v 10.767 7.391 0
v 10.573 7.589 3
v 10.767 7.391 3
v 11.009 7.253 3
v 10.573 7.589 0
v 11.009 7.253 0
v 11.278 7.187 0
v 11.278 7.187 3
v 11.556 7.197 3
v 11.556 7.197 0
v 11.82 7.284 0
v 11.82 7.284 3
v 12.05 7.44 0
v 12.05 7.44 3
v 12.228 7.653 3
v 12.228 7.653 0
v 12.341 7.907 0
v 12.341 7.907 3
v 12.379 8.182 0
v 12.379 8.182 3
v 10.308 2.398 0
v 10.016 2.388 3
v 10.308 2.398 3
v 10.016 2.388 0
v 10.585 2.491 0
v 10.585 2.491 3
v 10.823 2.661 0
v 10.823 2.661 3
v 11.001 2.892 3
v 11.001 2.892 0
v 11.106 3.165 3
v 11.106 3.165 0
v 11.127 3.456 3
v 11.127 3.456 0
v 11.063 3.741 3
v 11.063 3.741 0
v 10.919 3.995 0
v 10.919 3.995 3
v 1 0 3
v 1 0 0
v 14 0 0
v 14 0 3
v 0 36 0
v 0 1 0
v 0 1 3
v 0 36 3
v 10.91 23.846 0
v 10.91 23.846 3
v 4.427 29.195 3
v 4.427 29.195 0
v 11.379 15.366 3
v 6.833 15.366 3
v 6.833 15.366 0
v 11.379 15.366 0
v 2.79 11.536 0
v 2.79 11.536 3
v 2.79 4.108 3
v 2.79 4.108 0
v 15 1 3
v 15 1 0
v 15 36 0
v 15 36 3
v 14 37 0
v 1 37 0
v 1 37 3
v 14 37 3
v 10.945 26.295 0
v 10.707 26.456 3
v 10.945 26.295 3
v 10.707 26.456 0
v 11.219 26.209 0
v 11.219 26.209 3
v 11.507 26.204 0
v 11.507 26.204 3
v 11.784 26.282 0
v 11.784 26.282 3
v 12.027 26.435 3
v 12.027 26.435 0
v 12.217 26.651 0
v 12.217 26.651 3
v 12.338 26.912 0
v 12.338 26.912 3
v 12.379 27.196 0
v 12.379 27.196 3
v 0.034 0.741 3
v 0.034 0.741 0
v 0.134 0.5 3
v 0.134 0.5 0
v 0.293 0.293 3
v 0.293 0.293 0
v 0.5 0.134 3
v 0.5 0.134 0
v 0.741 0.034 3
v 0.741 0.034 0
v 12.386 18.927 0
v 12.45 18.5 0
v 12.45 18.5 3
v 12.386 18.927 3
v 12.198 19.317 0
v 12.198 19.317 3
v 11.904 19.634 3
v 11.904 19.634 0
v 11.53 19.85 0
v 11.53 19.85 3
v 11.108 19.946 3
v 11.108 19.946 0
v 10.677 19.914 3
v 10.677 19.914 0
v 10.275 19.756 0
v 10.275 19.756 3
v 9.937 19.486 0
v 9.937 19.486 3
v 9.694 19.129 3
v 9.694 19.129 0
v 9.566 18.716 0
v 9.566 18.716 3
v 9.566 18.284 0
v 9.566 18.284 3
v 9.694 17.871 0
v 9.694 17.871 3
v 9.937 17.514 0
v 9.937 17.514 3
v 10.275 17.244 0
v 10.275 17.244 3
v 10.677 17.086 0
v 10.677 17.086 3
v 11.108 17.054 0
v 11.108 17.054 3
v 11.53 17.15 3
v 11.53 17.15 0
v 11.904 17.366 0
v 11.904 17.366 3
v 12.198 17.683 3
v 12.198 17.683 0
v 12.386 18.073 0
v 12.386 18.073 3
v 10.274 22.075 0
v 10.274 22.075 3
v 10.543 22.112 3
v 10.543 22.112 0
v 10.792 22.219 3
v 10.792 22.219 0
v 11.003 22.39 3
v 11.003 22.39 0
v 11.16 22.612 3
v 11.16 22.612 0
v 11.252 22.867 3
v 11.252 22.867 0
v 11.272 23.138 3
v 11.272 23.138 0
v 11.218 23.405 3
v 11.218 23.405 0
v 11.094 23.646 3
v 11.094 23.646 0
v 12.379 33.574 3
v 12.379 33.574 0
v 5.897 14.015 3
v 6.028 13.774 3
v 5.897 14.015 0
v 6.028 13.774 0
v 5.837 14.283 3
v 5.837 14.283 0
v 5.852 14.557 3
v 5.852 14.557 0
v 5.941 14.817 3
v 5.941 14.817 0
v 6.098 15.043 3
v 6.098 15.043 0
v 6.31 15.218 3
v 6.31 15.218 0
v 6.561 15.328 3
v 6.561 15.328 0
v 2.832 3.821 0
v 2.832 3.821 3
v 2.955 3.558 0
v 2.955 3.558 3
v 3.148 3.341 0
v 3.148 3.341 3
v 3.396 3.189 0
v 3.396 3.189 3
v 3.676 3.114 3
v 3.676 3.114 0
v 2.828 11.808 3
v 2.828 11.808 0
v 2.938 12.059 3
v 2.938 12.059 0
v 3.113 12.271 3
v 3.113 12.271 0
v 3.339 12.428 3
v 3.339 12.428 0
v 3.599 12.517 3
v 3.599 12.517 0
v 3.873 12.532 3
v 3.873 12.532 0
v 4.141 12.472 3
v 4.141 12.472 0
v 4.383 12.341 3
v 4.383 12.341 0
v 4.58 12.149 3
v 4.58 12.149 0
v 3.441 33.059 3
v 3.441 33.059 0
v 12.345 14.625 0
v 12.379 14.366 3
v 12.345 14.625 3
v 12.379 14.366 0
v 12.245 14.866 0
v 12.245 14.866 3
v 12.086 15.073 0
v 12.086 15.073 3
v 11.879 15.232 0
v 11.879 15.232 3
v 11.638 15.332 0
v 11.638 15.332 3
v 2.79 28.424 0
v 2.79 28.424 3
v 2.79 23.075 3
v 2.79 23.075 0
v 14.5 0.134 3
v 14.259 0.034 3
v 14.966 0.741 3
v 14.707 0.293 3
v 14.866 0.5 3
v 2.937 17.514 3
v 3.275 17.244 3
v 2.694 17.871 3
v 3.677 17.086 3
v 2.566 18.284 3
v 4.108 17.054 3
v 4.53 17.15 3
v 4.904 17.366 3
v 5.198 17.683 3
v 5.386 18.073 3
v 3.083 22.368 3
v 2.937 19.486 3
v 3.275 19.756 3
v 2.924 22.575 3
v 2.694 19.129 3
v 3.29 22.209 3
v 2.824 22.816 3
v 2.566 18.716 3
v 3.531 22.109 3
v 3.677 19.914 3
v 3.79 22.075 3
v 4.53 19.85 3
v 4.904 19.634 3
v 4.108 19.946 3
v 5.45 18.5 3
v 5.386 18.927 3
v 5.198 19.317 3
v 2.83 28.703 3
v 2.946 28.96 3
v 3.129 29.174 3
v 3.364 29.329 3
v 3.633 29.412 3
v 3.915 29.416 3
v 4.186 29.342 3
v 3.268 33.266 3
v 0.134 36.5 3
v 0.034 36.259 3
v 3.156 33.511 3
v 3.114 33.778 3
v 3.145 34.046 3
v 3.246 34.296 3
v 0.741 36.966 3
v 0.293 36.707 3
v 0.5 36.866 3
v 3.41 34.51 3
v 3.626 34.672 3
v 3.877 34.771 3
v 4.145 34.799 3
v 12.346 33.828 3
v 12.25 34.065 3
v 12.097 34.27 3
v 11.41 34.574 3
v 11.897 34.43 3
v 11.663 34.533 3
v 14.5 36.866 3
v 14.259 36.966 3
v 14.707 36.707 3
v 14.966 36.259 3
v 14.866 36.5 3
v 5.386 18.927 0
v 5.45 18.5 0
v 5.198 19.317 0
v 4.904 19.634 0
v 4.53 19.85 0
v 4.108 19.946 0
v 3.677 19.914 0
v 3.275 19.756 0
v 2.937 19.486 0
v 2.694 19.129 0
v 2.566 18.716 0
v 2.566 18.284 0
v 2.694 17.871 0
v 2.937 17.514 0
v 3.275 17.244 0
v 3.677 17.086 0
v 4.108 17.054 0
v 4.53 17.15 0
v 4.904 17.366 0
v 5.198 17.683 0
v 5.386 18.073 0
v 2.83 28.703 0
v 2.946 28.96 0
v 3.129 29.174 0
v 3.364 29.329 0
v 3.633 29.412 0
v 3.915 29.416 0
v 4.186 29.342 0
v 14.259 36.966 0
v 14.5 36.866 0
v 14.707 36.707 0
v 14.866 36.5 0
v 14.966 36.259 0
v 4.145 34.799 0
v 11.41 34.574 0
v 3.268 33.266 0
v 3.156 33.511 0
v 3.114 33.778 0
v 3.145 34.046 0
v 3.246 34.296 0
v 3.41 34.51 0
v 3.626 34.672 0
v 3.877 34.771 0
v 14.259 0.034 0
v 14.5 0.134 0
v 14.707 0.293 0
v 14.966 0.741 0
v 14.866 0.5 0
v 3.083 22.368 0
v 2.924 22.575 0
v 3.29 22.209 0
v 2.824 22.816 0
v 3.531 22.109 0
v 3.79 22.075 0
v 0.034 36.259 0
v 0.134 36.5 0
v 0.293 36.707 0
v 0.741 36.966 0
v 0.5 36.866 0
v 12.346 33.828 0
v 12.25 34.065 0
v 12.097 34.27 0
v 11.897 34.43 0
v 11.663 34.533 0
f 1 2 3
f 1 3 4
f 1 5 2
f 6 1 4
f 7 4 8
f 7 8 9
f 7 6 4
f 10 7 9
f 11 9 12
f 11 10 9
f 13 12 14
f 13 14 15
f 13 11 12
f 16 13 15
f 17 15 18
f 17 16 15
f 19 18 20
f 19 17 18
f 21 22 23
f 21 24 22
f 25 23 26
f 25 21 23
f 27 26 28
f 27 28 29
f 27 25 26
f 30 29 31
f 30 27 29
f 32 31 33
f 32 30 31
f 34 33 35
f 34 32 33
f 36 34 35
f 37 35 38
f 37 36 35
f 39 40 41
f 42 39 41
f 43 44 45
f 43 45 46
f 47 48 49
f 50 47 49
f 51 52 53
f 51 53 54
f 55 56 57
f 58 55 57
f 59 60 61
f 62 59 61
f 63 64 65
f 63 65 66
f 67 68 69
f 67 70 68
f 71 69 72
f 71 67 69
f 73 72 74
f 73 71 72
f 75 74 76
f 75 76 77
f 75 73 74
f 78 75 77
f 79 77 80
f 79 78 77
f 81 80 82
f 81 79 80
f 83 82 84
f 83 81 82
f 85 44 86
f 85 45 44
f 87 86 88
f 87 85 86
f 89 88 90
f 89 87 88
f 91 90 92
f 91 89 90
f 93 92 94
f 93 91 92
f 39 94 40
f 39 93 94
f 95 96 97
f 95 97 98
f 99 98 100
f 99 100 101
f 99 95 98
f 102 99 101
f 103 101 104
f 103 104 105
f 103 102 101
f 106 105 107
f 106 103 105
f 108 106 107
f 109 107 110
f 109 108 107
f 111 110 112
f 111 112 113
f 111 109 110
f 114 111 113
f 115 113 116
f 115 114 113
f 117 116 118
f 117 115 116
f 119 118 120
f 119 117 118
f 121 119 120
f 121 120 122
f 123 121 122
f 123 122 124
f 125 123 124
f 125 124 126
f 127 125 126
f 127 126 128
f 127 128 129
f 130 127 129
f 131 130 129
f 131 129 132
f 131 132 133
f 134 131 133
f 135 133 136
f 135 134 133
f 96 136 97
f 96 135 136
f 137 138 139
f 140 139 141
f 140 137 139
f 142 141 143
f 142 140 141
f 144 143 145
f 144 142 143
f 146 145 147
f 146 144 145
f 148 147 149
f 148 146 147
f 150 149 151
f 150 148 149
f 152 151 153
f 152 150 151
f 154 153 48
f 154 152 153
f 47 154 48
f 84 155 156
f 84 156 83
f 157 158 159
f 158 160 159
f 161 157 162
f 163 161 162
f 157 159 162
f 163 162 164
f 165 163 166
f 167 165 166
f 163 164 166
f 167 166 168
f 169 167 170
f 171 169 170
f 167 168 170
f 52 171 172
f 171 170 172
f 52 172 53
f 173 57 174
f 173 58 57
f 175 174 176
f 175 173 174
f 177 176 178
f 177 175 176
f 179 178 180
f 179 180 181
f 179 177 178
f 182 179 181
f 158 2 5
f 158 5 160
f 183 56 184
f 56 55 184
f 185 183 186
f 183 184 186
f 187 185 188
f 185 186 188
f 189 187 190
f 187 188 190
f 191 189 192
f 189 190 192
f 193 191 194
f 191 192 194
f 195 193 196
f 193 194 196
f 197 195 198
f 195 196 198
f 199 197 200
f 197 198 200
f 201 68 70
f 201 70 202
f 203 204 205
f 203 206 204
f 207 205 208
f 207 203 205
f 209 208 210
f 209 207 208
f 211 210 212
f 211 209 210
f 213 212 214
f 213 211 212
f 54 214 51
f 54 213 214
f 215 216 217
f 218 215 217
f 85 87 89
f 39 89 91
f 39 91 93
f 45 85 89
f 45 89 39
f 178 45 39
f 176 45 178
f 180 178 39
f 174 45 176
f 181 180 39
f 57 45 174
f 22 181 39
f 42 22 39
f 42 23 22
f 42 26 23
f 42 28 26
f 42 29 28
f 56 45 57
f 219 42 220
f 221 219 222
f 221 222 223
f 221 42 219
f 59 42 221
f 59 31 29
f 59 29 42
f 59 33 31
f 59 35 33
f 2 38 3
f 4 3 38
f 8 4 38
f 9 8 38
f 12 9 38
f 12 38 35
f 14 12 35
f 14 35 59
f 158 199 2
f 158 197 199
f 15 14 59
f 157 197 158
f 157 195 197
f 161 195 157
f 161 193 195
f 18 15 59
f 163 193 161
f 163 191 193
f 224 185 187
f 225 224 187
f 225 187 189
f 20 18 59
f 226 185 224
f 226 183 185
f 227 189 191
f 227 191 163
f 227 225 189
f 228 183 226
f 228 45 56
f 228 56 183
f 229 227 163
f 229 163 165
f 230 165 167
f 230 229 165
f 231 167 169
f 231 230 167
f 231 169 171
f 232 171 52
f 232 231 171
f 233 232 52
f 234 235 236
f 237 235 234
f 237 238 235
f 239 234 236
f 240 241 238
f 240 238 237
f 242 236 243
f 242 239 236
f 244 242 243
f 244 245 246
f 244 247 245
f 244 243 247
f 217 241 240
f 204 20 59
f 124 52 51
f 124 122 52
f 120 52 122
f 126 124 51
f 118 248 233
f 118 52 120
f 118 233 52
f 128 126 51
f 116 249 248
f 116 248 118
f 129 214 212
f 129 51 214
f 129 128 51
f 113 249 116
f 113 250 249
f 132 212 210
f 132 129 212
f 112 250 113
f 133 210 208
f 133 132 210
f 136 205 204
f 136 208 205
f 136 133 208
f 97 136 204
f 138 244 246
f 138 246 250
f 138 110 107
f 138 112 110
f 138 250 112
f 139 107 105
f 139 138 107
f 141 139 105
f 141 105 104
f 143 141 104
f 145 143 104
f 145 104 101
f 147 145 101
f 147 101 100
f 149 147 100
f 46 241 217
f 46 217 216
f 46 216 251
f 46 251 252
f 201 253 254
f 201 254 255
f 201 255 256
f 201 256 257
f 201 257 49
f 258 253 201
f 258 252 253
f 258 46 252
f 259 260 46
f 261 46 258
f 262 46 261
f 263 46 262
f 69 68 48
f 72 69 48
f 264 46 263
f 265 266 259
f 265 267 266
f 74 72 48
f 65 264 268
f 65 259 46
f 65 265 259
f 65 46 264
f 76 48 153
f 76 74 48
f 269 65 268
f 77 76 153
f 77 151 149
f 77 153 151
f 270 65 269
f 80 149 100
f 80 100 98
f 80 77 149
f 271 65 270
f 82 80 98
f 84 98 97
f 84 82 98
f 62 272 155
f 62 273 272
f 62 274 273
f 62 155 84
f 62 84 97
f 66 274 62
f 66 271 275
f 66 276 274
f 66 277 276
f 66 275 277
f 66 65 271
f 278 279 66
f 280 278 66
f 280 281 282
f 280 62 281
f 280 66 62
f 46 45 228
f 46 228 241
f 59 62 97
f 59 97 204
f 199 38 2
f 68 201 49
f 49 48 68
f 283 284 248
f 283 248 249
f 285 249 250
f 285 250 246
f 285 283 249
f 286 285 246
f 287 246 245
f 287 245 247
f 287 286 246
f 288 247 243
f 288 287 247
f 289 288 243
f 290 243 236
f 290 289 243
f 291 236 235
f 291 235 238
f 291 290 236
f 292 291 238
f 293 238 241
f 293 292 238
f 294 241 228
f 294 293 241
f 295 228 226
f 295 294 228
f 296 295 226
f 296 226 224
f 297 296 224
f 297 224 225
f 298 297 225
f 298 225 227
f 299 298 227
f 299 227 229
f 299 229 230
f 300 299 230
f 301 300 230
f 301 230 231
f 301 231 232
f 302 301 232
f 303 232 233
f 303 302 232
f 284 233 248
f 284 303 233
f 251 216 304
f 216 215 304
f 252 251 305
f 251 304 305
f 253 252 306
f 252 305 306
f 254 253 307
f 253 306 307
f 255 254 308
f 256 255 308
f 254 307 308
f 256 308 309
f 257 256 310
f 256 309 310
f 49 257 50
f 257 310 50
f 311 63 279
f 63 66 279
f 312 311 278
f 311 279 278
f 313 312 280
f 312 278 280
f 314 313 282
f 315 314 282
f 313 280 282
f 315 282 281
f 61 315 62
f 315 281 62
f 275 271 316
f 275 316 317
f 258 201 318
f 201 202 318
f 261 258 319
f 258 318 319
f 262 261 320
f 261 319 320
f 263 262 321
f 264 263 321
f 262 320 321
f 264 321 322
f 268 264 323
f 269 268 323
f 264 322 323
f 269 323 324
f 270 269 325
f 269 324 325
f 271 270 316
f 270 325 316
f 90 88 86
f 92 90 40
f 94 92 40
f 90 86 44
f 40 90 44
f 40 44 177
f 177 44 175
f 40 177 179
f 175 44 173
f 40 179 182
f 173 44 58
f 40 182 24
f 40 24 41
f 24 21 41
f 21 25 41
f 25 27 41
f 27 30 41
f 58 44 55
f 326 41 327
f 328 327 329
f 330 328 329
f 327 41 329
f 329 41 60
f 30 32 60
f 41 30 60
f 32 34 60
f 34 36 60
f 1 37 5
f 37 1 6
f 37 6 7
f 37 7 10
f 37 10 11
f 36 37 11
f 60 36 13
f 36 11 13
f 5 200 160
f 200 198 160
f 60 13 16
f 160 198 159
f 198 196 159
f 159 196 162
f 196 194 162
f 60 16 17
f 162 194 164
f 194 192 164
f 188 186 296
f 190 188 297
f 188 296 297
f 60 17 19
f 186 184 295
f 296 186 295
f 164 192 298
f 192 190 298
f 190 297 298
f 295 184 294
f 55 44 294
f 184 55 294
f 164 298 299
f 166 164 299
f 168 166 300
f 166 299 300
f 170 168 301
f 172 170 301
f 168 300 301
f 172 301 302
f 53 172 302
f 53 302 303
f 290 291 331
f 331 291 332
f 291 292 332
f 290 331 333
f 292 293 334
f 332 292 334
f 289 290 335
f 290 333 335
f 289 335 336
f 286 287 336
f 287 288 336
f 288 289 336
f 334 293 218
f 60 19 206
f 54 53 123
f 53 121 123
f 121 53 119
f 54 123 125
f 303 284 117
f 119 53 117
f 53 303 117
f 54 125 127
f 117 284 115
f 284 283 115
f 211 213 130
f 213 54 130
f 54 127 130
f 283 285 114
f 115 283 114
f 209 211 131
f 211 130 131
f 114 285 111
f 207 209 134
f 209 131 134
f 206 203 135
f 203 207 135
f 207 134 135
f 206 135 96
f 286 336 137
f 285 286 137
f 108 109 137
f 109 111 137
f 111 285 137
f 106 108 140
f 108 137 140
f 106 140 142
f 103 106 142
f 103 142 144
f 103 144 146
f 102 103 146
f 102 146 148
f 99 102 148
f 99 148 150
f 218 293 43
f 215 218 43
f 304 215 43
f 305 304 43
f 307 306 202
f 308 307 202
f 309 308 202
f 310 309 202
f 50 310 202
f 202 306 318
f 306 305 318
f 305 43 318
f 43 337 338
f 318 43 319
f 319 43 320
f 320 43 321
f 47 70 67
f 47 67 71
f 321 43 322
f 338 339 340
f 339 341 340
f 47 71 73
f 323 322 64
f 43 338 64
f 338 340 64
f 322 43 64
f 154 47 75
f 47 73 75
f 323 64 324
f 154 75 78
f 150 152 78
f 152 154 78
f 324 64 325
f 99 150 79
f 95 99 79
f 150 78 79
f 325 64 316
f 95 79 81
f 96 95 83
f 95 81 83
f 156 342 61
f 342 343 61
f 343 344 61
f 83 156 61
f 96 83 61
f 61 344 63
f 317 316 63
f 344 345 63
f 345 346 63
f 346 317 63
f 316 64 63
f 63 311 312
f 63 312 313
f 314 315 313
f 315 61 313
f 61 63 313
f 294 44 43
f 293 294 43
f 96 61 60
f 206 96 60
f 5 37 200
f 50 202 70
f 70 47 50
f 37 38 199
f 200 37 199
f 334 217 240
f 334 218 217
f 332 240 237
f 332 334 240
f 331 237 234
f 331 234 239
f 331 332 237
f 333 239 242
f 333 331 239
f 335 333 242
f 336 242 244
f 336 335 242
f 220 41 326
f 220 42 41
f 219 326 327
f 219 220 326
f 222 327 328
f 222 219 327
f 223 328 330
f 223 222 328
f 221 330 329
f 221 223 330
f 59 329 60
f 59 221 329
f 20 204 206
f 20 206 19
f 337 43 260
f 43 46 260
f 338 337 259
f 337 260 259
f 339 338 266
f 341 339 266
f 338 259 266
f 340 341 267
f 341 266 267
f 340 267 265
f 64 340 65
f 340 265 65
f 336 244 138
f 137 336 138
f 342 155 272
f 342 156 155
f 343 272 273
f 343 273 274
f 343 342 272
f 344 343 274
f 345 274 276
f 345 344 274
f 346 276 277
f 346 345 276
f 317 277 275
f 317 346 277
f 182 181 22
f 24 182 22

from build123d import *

# Parameters (mm, degrees)
SKETCH_1_W          = 15
SKETCH_1_H          = 37
SKETCH_1_R          = 1.45
EXTRUDE_1_DEPTH     = 3
CUT_EXTRUDE_1_DEPTH = 10
FILLET_3_R          = 1


with BuildPart() as part:
    # 草图1 → 凸台-拉伸1 (new body)
    with BuildSketch(Plane.XY):
        with Locations((7.5, 18.5)):
            Rectangle(SKETCH_1_W, SKETCH_1_H)
        with Locations((4, 18.5)):
            Circle(SKETCH_1_R, mode=Mode.SUBTRACT)
        with Locations((11, 18.5)):
            Circle(SKETCH_1_R, mode=Mode.SUBTRACT)
    extrude(amount=EXTRUDE_1_DEPTH)

    # 草图2 → 切除-拉伸1 (cut)
    with BuildSketch(Plane.XY.offset(3)):
        Polygon((1.434880502, 34.882599316), (12.379202278, 34.543765824), (12.379202278, 24.936066313), align=None)
        Polygon((2.790214468, 30.545530624), (2.790214468, 22.074693336), (13.056869261, 22.074693336), align=None)
        Polygon((4.857098766, 15.365790203), (12.379202278, 15.365790203), (12.379202278, 5.133018759), align=None)
        Polygon((2.790214468, 14.450939776), (2.790214468, 3.215813333), (12.379202278, 2.117400684), align=None)
    extrude(amount=-CUT_EXTRUDE_1_DEPTH, mode=Mode.SUBTRACT)

    # 圆角3
    fillet_3_edges = [part.edges().sort_by_distance(p)[0] for p in [
        (2.790214468, 30.545530624, 1.5),
        (13.056869261, 22.074693336, 1.5),
        (2.790214468, 22.074693336, 1.5),
        (12.379202278, 5.133018759, 1.5),
        (4.857098766, 15.365790203, 1.5),
        (12.379202278, 15.365790203, 1.5),
        (2.790214468, 14.450939776, 1.5),
        (12.379202278, 2.117400684, 1.5),
        (2.790214468, 3.215813333, 1.5),
        (12.379202278, 24.936066313, 1.5),
        (1.434880502, 34.882599316, 1.5),
        (12.379202278, 34.543765824, 1.5),
        (0, 37, 1.5),
        (15, 37, 1.5),
        (15, 0, 1.5),
        (0, 0, 1.5),
    ]]
    fillet(fillet_3_edges, radius=FILLET_3_R)


solid = part.part
